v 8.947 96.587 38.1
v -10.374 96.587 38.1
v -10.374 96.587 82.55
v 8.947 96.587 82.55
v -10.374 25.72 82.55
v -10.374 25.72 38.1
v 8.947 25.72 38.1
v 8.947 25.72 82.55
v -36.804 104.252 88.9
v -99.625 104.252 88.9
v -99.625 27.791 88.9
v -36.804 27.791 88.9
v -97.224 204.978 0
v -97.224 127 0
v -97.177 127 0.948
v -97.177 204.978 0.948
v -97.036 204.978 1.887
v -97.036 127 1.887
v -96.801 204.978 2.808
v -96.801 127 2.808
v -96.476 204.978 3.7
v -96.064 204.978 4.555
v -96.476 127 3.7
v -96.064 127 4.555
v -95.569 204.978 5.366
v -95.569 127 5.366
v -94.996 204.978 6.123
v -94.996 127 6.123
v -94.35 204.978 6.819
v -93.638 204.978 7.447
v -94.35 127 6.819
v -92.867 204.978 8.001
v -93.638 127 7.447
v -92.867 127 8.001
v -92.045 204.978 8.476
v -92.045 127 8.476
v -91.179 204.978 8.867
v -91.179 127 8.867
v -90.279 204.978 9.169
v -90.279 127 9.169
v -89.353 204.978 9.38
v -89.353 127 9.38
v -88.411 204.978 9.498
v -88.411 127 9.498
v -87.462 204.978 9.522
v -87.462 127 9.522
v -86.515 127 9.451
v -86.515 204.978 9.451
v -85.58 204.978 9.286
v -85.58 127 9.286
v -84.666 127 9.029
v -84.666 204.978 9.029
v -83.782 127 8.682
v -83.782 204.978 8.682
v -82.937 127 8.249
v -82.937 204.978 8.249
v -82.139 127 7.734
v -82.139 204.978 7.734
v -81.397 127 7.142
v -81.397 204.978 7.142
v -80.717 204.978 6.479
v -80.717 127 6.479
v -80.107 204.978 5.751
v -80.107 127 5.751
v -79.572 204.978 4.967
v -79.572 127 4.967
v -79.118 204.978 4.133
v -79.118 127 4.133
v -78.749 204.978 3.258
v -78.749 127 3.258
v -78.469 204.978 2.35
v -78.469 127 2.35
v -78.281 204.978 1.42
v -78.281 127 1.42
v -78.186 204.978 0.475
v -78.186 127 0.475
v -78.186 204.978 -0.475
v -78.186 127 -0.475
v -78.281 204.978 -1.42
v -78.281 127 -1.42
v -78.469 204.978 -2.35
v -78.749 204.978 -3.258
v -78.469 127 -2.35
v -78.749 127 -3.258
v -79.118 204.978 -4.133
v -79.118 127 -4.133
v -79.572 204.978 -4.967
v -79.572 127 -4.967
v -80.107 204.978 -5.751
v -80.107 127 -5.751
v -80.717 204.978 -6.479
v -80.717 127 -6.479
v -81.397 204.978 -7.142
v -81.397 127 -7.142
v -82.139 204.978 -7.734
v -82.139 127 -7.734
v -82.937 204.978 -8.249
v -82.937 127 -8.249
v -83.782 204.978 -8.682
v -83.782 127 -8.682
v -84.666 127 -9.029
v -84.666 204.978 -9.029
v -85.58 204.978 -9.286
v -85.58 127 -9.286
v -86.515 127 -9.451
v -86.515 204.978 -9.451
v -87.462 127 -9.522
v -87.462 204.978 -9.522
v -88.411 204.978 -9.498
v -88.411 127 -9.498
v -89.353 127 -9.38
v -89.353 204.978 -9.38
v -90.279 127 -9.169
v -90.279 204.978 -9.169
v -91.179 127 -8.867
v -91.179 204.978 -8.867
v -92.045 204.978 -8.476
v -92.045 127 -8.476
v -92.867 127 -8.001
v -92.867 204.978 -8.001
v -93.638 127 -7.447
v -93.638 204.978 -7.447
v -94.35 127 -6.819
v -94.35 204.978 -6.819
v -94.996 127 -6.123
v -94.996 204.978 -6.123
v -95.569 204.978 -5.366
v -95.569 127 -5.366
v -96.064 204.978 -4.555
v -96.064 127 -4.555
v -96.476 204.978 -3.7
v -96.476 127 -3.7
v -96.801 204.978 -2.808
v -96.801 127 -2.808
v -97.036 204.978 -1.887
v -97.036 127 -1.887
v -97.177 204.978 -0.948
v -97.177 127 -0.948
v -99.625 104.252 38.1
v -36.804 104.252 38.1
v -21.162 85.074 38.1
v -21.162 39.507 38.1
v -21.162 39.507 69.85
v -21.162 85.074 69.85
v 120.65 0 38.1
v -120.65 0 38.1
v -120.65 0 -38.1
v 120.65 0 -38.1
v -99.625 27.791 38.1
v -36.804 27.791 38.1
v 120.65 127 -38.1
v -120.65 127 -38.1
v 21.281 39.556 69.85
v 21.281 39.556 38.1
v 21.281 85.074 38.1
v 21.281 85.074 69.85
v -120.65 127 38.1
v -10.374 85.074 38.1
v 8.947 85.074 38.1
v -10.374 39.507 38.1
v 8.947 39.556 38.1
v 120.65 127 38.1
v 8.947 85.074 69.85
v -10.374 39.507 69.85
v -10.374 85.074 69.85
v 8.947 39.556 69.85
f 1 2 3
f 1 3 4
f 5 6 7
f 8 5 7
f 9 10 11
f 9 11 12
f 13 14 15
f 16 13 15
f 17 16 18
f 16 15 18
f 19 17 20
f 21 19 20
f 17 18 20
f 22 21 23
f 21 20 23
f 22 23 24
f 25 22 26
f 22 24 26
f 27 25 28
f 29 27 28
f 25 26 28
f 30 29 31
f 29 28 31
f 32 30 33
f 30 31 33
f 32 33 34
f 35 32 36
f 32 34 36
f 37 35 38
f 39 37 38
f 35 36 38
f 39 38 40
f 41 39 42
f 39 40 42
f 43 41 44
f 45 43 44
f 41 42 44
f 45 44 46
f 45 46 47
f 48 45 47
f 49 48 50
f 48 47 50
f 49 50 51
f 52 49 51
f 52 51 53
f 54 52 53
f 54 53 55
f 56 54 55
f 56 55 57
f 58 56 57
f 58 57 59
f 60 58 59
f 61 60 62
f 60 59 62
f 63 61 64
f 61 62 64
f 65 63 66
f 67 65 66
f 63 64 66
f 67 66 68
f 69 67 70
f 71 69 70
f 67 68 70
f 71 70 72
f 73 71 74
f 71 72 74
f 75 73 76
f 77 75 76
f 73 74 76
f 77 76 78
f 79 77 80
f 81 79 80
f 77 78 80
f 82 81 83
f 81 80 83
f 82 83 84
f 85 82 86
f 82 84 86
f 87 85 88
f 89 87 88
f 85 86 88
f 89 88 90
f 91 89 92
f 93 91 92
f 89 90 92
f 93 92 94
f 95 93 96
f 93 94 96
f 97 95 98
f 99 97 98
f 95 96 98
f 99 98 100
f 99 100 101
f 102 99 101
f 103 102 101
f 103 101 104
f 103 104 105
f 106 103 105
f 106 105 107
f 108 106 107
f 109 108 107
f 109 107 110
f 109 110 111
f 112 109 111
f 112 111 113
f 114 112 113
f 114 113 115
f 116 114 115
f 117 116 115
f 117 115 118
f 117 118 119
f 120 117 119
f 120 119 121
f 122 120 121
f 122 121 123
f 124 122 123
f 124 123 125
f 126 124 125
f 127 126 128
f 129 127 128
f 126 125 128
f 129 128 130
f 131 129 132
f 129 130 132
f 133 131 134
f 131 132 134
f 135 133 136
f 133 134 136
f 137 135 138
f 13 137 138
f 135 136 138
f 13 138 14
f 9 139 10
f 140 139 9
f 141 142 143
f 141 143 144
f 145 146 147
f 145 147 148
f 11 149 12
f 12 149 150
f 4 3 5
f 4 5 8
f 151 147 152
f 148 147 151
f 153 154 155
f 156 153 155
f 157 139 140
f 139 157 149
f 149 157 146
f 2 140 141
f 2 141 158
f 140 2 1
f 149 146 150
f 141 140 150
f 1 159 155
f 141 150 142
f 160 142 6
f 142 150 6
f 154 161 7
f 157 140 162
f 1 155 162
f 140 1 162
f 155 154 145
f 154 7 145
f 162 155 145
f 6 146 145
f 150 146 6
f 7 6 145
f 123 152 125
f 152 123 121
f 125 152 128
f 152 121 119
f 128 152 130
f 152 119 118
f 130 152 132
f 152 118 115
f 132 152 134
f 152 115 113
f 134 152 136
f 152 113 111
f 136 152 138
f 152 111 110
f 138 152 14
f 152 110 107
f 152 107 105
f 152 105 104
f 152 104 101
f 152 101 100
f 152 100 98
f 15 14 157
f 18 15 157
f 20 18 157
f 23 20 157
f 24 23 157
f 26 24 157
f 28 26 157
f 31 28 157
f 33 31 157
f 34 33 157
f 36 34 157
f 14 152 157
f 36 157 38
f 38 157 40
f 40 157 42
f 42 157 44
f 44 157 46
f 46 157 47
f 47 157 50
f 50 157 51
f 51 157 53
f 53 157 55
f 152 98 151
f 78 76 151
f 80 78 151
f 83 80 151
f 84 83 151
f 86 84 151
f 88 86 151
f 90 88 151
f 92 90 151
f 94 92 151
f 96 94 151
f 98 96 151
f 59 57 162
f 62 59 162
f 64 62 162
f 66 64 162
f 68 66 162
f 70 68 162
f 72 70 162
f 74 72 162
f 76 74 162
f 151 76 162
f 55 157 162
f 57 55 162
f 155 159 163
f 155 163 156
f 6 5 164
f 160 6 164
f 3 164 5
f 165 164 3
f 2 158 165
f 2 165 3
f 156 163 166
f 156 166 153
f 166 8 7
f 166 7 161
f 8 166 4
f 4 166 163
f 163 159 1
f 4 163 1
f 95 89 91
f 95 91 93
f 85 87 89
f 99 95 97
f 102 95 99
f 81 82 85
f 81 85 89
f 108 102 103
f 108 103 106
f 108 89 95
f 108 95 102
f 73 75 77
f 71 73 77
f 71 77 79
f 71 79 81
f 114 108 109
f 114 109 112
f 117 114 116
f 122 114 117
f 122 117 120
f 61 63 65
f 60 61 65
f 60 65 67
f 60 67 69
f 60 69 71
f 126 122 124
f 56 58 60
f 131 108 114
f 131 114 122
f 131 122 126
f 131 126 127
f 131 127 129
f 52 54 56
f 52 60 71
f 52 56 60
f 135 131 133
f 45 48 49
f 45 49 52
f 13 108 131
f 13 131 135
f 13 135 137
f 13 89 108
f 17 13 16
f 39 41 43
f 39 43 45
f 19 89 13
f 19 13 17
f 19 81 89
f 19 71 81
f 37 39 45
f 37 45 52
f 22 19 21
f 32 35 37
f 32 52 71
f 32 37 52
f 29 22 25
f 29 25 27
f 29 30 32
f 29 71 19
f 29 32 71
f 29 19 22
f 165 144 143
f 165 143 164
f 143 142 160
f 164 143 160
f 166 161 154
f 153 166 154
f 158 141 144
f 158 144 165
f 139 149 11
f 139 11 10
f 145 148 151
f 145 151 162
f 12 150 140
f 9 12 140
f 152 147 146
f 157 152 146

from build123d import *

# Parameters (mm, degrees)
F0_W     = 241.3
F0_H     = 76.2
F1_DEPTH = 127
F2_W     = 62.8207884729
F2_H     = 76.4612257481
F3_DEPTH = 50.8
F4_W     = 19.3203594536
F4_H     = 70.8669982851
F5_DEPTH = 44.45
F6_W     = 10.7880616561
F6_H     = 45.5669872463
F6_W_2   = 12.3340738937
F6_H_2   = 45.5182045698
F7_DEPTH = 31.75
F8_R     = 9.525
F9_DEPTH = 77.978


with BuildPart() as f1:
    # F0 (on Front) → F1 (new body)
    with BuildSketch(Plane.XZ):
        Rectangle(F0_W, F0_H)
    extrude(amount=-F1_DEPTH)

    # F2 (on face) → F3 (join)
    with BuildSketch(Plane.XY.offset(38.1)):
        with Locations((-68.2148206979, 66.0216137767)):
            Rectangle(F2_W, F2_H)
    extrude(amount=F3_DEPTH)

    # F4 (on face) → F5 (join)
    with BuildSketch(Plane.XY.offset(38.1)):
        with Locations((-0.7133577019, 61.1537639052)):
            Rectangle(F4_W, F4_H)
    extrude(amount=F5_DEPTH)

    # F6 (on face) → F7 (join)
    with BuildSketch(Plane.XY.offset(38.1)):
        with Locations((-15.7675682567, 62.2907597572)):
            Rectangle(F6_W, F6_H)
        with Locations((15.1138589717, 62.3151510954)):
            Rectangle(F6_W_2, F6_H_2)
    extrude(amount=F7_DEPTH)

    # F8 (on face) → F9 (join)
    with BuildSketch(Plane(origin=(0, 127, 0), x_dir=(-1, 0, 0), z_dir=(0, 1, 0))):
        with Locations((87.699372661, 0)):
            Circle(F8_R)
    extrude(amount=F9_DEPTH)


solid = f1.part
